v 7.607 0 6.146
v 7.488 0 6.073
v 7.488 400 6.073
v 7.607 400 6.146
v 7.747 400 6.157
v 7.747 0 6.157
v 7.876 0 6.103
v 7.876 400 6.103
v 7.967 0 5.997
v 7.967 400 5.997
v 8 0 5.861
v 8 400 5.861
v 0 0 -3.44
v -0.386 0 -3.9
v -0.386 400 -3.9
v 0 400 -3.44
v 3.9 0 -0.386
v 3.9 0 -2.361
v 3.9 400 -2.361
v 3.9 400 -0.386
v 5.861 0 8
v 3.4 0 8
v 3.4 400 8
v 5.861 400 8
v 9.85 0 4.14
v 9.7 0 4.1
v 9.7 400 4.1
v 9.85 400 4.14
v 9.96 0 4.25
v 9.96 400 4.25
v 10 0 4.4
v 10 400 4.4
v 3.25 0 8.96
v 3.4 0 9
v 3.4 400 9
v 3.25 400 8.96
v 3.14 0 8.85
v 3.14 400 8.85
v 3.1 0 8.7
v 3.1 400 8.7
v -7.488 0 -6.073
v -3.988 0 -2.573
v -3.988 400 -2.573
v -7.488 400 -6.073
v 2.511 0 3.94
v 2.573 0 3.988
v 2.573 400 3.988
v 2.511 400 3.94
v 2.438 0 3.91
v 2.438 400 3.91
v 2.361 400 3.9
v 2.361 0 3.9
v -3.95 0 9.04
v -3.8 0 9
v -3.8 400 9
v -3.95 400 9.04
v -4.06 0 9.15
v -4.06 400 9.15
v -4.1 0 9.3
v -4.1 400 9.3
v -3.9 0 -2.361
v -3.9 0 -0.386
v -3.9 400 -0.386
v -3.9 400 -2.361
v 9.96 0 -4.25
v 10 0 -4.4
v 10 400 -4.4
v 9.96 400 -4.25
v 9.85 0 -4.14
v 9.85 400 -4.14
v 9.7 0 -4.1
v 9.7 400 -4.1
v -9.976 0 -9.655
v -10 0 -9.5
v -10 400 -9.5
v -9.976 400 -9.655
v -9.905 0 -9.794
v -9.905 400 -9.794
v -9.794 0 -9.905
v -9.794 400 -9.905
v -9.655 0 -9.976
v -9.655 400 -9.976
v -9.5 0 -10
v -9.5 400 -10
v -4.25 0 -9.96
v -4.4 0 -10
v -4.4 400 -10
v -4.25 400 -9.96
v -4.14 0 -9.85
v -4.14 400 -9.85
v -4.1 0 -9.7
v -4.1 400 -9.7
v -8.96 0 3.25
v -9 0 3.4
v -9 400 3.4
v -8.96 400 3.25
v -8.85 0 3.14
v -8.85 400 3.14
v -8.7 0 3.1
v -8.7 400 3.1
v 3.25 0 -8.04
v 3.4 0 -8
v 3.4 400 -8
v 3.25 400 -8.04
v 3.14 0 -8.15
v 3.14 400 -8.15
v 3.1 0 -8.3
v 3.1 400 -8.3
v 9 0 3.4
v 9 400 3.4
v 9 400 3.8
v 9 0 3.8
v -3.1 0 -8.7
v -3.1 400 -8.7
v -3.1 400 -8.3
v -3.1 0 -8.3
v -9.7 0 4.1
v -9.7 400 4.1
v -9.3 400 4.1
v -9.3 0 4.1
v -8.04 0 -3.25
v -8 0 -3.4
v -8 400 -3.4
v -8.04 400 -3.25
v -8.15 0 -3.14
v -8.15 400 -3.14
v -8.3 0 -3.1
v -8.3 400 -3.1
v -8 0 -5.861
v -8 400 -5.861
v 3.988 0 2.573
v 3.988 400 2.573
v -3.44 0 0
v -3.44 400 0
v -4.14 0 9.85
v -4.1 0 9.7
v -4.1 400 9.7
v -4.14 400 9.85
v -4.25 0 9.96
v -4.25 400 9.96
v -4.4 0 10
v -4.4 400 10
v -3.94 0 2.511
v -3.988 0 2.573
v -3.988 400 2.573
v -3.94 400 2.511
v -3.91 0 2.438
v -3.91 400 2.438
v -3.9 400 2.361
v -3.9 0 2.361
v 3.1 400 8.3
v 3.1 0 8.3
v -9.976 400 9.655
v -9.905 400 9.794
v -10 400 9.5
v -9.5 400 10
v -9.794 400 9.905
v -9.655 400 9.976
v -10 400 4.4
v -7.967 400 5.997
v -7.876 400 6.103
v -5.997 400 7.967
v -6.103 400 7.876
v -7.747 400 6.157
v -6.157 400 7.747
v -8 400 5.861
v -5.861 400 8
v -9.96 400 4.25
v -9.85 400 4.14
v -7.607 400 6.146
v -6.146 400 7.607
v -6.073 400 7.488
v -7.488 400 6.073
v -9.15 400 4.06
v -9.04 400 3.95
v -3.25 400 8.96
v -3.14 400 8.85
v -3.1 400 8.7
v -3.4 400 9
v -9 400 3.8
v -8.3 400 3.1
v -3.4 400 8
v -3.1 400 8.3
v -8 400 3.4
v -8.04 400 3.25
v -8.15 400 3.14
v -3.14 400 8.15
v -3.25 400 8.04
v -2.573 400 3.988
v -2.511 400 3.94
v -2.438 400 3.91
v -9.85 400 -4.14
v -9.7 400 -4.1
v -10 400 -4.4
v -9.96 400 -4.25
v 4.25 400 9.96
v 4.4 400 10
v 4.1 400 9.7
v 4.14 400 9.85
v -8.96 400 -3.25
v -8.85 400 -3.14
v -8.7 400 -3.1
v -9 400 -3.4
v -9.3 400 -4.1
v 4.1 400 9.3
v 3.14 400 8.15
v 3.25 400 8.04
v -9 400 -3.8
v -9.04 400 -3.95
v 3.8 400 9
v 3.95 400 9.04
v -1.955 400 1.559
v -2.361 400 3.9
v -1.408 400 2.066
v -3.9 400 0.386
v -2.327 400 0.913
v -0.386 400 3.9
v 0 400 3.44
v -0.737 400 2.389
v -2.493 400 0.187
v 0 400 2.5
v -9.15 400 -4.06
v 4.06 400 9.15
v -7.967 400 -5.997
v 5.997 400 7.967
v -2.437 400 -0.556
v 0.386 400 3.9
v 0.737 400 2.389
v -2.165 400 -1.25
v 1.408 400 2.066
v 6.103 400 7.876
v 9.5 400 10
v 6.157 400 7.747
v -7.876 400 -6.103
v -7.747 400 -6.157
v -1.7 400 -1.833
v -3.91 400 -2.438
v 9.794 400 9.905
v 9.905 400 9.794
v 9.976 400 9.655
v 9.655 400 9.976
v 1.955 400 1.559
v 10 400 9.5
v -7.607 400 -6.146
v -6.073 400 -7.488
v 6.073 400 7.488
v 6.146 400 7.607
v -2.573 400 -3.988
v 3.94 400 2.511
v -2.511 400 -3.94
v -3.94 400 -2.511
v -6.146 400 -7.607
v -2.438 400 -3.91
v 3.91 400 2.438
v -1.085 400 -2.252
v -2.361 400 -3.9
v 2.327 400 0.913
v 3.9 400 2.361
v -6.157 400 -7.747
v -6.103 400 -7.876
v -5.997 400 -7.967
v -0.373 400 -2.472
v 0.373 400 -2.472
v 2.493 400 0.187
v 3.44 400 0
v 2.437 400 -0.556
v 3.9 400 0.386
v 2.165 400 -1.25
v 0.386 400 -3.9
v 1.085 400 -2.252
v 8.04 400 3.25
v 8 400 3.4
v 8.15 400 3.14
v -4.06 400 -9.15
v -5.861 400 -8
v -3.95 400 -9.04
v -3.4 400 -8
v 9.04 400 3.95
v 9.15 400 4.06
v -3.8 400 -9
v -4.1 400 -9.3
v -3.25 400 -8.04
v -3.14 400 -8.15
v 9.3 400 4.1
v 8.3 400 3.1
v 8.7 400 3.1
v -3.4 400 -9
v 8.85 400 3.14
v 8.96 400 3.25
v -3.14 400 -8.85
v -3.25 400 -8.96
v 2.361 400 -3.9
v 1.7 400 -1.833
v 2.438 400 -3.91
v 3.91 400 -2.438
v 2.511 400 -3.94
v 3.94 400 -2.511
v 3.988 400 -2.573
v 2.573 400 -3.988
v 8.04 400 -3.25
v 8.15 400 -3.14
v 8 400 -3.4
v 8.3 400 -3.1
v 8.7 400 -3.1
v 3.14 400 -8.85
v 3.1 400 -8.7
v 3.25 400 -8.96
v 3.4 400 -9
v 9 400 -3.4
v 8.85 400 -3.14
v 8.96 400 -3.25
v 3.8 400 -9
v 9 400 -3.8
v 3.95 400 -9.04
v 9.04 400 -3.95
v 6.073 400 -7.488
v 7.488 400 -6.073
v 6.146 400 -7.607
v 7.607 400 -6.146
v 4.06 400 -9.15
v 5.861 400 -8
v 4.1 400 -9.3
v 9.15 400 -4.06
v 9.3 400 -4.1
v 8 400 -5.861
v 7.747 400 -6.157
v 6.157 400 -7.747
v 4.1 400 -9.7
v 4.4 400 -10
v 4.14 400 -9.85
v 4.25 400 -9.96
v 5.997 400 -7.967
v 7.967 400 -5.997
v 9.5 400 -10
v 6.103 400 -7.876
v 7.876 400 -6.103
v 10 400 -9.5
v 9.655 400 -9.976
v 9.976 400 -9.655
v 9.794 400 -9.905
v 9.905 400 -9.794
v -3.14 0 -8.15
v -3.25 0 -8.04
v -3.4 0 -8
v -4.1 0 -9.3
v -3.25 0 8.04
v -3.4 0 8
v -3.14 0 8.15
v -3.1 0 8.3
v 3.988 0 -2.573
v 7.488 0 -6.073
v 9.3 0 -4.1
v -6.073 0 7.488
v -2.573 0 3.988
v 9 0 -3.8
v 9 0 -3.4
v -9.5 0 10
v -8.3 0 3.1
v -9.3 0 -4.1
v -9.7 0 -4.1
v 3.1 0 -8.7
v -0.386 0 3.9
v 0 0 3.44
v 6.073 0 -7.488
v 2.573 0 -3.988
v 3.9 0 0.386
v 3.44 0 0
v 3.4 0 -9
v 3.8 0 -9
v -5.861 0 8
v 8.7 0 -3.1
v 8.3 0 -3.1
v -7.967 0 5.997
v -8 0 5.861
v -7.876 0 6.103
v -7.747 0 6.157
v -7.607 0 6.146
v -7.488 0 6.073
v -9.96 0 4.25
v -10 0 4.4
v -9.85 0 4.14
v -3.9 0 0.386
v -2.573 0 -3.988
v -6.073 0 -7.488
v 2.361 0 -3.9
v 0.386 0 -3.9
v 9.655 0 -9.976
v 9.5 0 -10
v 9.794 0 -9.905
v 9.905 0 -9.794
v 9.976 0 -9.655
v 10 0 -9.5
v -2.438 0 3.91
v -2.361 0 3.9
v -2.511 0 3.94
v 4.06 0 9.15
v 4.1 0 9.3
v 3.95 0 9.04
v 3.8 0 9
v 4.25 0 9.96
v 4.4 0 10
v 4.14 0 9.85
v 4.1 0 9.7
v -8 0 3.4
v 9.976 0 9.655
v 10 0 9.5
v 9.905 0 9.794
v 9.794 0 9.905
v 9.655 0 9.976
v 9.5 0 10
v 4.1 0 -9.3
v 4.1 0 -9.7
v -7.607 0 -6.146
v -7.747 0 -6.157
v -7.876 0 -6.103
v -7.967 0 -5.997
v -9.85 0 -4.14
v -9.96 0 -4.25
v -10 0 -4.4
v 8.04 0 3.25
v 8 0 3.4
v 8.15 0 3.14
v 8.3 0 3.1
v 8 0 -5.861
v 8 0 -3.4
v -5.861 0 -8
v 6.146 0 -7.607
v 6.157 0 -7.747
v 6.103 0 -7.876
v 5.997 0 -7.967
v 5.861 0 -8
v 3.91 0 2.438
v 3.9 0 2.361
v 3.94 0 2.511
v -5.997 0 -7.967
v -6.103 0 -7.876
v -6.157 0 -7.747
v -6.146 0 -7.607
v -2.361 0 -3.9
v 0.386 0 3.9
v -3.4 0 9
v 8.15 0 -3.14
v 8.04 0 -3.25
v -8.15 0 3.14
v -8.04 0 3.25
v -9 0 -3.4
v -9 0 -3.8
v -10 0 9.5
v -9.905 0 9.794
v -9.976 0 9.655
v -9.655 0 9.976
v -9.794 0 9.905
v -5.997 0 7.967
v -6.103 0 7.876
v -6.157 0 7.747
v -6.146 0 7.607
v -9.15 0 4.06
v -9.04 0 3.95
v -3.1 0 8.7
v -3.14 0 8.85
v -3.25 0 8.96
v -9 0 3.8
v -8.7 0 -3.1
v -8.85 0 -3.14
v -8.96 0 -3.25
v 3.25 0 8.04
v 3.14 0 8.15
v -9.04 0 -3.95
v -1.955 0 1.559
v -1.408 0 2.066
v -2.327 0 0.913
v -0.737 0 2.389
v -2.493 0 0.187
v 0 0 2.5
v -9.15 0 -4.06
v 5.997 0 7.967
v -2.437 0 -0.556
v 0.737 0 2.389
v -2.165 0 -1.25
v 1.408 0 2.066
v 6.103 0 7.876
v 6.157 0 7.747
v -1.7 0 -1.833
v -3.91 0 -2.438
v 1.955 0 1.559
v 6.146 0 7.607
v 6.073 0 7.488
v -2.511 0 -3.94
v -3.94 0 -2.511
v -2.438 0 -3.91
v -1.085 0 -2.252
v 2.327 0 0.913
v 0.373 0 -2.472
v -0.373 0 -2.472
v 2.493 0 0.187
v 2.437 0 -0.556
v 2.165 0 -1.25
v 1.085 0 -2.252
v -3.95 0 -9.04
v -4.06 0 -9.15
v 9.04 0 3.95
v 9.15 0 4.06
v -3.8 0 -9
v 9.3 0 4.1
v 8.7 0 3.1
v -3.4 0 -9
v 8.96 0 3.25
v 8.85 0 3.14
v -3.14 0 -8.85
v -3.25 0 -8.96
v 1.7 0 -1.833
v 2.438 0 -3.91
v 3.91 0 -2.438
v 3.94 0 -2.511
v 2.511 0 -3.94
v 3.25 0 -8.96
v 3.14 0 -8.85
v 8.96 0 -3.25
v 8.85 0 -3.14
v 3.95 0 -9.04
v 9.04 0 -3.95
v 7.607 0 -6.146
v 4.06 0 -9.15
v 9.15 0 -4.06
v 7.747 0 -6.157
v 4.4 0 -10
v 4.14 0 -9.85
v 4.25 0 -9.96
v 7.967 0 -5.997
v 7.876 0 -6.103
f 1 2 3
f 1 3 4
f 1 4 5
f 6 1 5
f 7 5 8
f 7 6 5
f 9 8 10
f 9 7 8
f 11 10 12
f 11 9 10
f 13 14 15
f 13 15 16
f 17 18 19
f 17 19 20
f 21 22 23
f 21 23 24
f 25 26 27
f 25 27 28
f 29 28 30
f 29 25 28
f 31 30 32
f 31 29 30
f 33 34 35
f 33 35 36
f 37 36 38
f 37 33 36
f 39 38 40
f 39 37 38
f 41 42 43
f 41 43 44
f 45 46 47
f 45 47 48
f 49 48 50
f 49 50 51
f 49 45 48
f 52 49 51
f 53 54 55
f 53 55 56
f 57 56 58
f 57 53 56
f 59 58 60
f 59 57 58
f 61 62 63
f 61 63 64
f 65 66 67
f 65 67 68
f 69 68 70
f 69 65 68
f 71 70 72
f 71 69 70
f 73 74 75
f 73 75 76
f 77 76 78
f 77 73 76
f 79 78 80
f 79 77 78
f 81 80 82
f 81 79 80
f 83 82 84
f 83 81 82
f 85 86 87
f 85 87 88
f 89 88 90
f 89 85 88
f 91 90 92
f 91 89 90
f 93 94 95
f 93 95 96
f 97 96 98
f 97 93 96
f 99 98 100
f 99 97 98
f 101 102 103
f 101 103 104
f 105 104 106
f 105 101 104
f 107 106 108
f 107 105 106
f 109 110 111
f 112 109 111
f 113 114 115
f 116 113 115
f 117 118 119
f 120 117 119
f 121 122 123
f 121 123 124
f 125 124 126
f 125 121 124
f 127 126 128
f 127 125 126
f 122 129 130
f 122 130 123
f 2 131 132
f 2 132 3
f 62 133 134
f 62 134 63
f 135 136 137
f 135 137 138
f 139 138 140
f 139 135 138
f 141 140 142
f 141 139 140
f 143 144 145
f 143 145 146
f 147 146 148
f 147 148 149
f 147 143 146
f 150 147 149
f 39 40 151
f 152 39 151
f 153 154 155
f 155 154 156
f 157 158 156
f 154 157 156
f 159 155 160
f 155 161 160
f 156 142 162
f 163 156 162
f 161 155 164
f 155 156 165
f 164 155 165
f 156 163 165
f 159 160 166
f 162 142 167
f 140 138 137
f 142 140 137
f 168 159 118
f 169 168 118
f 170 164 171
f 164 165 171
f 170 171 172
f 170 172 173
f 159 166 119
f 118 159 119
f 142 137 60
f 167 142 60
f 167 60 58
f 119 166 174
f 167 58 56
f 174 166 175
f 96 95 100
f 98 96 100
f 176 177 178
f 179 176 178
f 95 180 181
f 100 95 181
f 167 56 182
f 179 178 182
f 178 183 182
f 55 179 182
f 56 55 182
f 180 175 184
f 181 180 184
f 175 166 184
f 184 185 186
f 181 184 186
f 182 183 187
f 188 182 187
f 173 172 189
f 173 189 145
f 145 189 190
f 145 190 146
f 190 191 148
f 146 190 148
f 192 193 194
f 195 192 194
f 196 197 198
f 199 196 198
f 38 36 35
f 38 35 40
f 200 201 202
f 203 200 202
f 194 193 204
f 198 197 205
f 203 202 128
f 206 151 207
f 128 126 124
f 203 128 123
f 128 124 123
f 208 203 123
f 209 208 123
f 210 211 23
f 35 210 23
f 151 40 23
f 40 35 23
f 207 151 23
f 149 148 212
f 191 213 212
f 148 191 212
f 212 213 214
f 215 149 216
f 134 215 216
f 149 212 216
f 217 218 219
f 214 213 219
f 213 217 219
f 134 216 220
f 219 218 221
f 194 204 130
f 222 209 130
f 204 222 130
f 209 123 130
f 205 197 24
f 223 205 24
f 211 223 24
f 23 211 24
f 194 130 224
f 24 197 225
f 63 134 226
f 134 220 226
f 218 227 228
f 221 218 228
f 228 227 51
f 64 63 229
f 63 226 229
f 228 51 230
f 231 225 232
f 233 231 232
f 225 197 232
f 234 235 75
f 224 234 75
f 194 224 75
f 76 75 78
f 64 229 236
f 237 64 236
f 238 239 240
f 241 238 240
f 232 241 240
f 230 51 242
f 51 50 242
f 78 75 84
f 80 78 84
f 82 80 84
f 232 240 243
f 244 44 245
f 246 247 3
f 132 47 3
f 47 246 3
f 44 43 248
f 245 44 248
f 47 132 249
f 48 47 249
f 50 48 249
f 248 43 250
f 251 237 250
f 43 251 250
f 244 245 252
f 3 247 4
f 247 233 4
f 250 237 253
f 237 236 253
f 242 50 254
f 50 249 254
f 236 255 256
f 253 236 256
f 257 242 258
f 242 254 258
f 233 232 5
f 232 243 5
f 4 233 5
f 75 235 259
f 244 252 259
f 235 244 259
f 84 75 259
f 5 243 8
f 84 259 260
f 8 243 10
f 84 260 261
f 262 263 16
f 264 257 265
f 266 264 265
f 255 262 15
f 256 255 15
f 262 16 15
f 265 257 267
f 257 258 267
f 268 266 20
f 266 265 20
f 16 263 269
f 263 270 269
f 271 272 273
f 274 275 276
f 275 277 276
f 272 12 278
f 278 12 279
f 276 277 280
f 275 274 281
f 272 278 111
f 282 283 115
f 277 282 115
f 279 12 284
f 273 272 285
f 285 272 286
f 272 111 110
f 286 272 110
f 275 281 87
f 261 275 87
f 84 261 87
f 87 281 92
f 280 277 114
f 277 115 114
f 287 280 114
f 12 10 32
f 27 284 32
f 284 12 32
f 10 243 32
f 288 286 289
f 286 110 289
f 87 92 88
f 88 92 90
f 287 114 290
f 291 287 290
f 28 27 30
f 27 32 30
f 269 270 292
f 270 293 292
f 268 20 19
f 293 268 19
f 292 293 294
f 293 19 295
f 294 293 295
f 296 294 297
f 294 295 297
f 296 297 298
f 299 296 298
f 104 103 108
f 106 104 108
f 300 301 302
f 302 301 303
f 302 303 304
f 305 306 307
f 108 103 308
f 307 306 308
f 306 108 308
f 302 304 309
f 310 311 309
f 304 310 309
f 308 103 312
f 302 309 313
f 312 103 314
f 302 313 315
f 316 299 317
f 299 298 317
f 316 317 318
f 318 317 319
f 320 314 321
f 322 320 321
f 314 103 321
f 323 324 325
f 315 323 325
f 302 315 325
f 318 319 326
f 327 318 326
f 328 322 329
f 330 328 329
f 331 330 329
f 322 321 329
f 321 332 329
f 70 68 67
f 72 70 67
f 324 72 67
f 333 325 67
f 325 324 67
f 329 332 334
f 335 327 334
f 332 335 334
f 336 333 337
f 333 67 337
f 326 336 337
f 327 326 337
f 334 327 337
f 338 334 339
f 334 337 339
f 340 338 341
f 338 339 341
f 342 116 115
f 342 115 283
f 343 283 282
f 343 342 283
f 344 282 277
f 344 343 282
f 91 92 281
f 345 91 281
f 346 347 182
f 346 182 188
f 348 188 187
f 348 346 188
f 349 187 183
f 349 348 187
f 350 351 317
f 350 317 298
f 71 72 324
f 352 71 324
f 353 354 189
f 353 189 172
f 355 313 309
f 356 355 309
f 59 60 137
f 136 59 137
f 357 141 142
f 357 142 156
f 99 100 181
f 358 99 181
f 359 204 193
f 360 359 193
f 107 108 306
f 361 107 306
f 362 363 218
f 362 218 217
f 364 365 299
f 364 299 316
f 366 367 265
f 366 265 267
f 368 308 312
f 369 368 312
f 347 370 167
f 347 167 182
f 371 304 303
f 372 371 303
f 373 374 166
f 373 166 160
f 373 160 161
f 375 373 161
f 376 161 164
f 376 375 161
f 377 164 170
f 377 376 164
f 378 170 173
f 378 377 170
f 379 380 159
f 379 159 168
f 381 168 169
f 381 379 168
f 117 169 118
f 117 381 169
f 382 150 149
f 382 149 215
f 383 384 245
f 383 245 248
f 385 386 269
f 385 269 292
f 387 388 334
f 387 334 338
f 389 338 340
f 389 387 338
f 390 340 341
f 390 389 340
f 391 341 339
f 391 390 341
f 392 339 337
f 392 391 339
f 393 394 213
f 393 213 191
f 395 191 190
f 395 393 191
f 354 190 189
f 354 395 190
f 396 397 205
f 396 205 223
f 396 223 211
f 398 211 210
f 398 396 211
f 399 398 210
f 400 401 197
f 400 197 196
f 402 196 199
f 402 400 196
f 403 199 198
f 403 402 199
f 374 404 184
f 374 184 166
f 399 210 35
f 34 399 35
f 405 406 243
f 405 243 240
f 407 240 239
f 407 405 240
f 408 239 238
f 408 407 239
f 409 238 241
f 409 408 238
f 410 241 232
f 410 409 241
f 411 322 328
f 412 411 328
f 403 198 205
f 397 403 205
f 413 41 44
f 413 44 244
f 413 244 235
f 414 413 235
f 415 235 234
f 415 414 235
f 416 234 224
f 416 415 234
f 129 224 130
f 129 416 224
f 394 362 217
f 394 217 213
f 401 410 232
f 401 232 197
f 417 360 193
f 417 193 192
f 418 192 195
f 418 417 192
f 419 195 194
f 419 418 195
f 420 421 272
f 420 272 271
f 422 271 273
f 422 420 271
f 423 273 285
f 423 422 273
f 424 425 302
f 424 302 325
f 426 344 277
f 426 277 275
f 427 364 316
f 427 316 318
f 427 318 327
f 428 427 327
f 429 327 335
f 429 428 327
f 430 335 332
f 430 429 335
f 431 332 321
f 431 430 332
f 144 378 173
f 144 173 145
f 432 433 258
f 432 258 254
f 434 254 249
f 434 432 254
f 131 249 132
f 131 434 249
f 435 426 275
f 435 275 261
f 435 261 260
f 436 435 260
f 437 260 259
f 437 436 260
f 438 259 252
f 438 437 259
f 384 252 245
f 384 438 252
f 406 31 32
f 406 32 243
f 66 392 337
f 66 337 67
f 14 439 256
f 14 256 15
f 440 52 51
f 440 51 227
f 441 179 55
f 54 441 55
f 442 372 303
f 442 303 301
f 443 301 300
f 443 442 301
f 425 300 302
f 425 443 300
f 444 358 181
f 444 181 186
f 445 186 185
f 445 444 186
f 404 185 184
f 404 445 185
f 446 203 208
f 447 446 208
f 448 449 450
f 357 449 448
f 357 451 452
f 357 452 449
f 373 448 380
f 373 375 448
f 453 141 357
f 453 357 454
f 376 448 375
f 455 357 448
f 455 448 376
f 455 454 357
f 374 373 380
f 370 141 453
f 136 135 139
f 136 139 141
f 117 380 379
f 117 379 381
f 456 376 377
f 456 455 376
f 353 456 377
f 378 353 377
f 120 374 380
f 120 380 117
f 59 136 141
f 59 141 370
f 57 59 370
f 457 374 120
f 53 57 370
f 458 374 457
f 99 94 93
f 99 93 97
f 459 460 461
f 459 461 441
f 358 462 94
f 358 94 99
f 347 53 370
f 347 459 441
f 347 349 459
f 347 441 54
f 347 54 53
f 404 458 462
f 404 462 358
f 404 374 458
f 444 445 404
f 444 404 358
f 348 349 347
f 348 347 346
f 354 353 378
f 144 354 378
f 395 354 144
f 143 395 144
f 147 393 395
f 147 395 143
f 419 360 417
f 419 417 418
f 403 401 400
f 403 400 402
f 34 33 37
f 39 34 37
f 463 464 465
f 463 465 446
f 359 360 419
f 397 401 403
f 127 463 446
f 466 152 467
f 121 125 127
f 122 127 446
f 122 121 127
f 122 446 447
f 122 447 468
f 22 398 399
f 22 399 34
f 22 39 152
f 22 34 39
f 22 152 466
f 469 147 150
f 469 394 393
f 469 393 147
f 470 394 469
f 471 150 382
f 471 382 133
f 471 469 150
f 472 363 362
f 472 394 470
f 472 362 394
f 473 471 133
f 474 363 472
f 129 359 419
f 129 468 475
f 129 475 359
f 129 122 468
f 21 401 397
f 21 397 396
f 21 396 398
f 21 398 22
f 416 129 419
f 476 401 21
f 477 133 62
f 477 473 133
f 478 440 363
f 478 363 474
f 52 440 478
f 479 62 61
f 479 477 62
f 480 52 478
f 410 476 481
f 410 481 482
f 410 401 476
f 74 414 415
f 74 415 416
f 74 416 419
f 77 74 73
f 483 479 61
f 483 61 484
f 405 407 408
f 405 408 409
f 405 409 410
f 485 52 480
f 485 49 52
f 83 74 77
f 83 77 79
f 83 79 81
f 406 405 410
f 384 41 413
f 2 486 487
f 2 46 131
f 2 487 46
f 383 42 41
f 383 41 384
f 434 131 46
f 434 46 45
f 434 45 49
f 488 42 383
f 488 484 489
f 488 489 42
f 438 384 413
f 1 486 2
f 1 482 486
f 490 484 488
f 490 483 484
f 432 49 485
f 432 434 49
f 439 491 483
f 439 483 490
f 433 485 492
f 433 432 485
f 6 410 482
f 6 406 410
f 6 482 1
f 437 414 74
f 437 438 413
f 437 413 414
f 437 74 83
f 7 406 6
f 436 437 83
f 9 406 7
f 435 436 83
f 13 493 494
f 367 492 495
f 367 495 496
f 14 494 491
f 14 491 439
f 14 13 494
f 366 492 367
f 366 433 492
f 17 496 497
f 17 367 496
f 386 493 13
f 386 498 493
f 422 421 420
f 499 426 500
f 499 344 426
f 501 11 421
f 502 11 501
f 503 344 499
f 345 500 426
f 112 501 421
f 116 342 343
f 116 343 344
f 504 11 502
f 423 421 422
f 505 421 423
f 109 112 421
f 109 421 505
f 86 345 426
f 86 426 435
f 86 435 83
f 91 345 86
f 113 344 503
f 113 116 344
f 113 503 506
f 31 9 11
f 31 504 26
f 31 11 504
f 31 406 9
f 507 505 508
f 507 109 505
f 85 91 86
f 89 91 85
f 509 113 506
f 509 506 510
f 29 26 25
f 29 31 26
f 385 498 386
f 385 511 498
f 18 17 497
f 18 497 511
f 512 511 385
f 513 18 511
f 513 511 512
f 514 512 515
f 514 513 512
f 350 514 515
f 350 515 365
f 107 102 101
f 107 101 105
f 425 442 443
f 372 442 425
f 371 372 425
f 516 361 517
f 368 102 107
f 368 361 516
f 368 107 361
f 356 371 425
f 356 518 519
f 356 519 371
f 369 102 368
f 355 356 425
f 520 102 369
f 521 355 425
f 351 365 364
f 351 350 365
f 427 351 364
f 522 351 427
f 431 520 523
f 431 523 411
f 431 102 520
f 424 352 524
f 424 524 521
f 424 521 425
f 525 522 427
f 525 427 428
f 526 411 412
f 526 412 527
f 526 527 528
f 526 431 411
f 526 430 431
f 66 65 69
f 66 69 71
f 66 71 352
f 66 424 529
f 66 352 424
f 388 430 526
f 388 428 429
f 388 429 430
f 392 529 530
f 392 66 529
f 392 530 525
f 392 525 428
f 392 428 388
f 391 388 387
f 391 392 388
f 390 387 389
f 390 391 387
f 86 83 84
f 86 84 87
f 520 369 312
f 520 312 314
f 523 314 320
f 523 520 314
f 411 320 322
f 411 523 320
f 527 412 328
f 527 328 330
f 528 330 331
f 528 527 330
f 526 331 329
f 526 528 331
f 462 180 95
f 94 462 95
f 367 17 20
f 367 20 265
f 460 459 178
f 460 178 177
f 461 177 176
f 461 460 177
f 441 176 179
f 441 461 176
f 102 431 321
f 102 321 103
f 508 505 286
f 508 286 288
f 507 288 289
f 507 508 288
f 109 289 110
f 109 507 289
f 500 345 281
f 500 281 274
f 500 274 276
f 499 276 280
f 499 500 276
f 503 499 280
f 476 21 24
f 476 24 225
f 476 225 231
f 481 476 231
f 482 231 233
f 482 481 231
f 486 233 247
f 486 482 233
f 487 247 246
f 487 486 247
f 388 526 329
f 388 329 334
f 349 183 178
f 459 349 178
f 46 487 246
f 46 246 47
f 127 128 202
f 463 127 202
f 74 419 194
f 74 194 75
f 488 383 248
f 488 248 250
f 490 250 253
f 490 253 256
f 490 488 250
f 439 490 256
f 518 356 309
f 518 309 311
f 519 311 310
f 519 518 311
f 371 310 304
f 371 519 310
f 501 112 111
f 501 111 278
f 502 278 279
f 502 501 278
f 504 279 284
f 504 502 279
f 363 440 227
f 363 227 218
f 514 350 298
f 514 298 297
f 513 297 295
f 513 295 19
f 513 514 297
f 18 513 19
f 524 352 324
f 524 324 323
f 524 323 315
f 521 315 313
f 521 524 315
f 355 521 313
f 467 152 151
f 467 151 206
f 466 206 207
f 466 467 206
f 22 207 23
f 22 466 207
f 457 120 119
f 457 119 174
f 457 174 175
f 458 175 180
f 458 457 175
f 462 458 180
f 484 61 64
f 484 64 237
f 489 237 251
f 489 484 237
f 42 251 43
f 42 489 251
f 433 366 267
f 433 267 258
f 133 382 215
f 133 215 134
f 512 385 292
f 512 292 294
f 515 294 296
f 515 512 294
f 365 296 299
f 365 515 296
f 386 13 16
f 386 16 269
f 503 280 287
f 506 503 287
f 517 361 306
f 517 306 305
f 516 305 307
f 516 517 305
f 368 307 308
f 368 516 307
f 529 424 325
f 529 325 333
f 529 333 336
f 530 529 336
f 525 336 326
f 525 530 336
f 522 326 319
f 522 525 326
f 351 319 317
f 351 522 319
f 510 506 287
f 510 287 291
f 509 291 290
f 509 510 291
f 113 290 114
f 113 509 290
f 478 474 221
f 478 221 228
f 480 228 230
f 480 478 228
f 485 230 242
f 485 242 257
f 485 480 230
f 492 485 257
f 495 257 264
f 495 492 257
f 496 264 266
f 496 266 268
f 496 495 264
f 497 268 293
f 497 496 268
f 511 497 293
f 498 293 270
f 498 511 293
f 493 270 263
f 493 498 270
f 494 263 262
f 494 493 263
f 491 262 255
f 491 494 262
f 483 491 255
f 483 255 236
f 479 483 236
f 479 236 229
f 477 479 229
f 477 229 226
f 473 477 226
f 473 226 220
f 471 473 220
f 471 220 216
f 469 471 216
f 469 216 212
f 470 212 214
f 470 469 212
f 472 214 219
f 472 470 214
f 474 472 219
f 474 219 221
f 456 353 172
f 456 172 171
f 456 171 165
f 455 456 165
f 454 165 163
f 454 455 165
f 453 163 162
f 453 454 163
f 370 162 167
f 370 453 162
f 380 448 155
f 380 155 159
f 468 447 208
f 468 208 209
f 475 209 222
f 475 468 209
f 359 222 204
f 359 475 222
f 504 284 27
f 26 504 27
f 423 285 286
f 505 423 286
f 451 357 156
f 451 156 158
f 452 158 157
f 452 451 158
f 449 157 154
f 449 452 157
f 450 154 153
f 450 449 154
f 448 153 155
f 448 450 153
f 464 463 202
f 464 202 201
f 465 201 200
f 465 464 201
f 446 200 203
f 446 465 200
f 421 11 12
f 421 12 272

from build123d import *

# Parameters (mm, degrees)
SKETCH2_R                 = 2.5
VUONG_NHOMDH20X20_1_DEPTH = 400


with BuildPart() as part:
    # Sketch2 → Vuong NHOMDH20X20(1) (new body)
    with BuildSketch(Plane.ZX):
        with BuildLine():
            Line((0.385672566, 3.9), (2.360735931, 3.9))
            ThreePointArc((2.360735931, 3.9), (2.475540961, 3.92283614), (2.572867966, 3.987867966))
            Line((2.572867966, 3.987867966), (6.072867966, 7.487867966))
            ThreePointArc((6.072867966, 7.487867966), (6.137899791, 7.81480503), (5.860735931, 8))
            Line((5.860735931, 8), (3.4, 8))
            ThreePointArc((3.4, 8), (3.187867966, 8.087867966), (3.1, 8.3))
            Line((3.1, 8.3), (3.1, 8.7))
            ThreePointArc((3.1, 8.7), (3.187867966, 8.912132034), (3.4, 9))
            Line((3.4, 9), (3.8, 9))
            ThreePointArc((3.8, 9), (4.012132034, 9.087867966), (4.1, 9.3))
            Line((4.1, 9.3), (4.1, 9.7))
            ThreePointArc((4.1, 9.7), (4.187867966, 9.912132034), (4.4, 10))
            Line((4.4, 10), (9.5, 10))
            ThreePointArc((9.5, 10), (9.853553391, 9.853553391), (10, 9.5))
            Line((10, 9.5), (10, 4.4))
            ThreePointArc((10, 4.4), (9.912132034, 4.187867966), (9.7, 4.1))
            Line((9.7, 4.1), (9.3, 4.1))
            ThreePointArc((9.3, 4.1), (9.087867966, 4.012132034), (9, 3.8))
            Line((9, 3.8), (9, 3.4))
            ThreePointArc((9, 3.4), (8.912132034, 3.187867966), (8.7, 3.1))
            Line((8.7, 3.1), (8.3, 3.1))
            ThreePointArc((8.3, 3.1), (8.087867966, 3.187867966), (8, 3.4))
            Line((8, 3.4), (8, 5.860735931))
            ThreePointArc((8, 5.860735931), (7.81480503, 6.137899791), (7.487867966, 6.072867966))
            Line((7.487867966, 6.072867966), (3.987867966, 2.572867966))
            ThreePointArc((3.987867966, 2.572867966), (3.92283614, 2.475540961), (3.9, 2.360735931))
            Line((3.9, 2.360735931), (3.9, 0.385672566))
            Line((3.9, 0.385672566), (3.440373334, 0))
            Line((3.440373334, 0), (3.9, -0.385672566))
            Line((3.9, -0.385672566), (3.9, -2.360735931))
            ThreePointArc((3.9, -2.360735931), (3.92283614, -2.475540961), (3.987867966, -2.572867966))
            Line((3.987867966, -2.572867966), (7.487867966, -6.072867966))
            ThreePointArc((7.487867966, -6.072867966), (7.81480503, -6.137899791), (8, -5.860735931))
            Line((8, -5.860735931), (8, -3.4))
            ThreePointArc((8, -3.4), (8.087867966, -3.187867966), (8.3, -3.1))
            Line((8.3, -3.1), (8.7, -3.1))
            ThreePointArc((8.7, -3.1), (8.912132034, -3.187867966), (9, -3.4))
            Line((9, -3.4), (9, -3.8))
            ThreePointArc((9, -3.8), (9.087867966, -4.012132034), (9.3, -4.1))
            Line((9.3, -4.1), (9.7, -4.1))
            ThreePointArc((9.7, -4.1), (9.912132034, -4.187867966), (10, -4.4))
            Line((10, -4.4), (10, -9.5))
            ThreePointArc((10, -9.5), (9.853553391, -9.853553391), (9.5, -10))
            Line((9.5, -10), (4.4, -10))
            ThreePointArc((4.4, -10), (4.187867966, -9.912132034), (4.1, -9.7))
            Line((4.1, -9.7), (4.1, -9.3))
            ThreePointArc((4.1, -9.3), (4.012132034, -9.087867966), (3.8, -9))
            Line((3.8, -9), (3.4, -9))
            ThreePointArc((3.4, -9), (3.187867966, -8.912132034), (3.1, -8.7))
            Line((3.1, -8.7), (3.1, -8.3))
            ThreePointArc((3.1, -8.3), (3.187867966, -8.087867966), (3.4, -8))
            Line((3.4, -8), (5.860735931, -8))
            ThreePointArc((5.860735931, -8), (6.137899791, -7.81480503), (6.072867966, -7.487867966))
            Line((6.072867966, -7.487867966), (2.572867966, -3.987867966))
            ThreePointArc((2.572867966, -3.987867966), (2.475540961, -3.92283614), (2.360735931, -3.9))
            Line((2.360735931, -3.9), (0.385672566, -3.9))
            Line((0.385672566, -3.9), (0, -3.440373334))
            Line((0, -3.440373334), (-0.385672566, -3.9))
            Line((-0.385672566, -3.9), (-2.360735931, -3.9))
            ThreePointArc((-2.360735931, -3.9), (-2.475540961, -3.92283614), (-2.572867966, -3.987867966))
            Line((-2.572867966, -3.987867966), (-6.072867966, -7.487867966))
            ThreePointArc((-6.072867966, -7.487867966), (-6.137899791, -7.81480503), (-5.860735931, -8))
            Line((-5.860735931, -8), (-3.4, -8))
            ThreePointArc((-3.4, -8), (-3.187867966, -8.087867966), (-3.1, -8.3))
            Line((-3.1, -8.3), (-3.1, -8.7))
            ThreePointArc((-3.1, -8.7), (-3.187867966, -8.912132034), (-3.4, -9))
            Line((-3.4, -9), (-3.8, -9))
            ThreePointArc((-3.8, -9), (-4.012132034, -9.087867966), (-4.1, -9.3))
            Line((-4.1, -9.3), (-4.1, -9.7))
            ThreePointArc((-4.1, -9.7), (-4.187867966, -9.912132034), (-4.4, -10))
            Line((-4.4, -10), (-9.5, -10))
            ThreePointArc((-9.5, -10), (-9.853553391, -9.853553391), (-10, -9.5))
            Line((-10, -9.5), (-10, -4.4))
            ThreePointArc((-10, -4.4), (-9.912132034, -4.187867966), (-9.7, -4.1))
            Line((-9.7, -4.1), (-9.3, -4.1))
            ThreePointArc((-9.3, -4.1), (-9.087867966, -4.012132034), (-9, -3.8))
            Line((-9, -3.8), (-9, -3.4))
            ThreePointArc((-9, -3.4), (-8.912132034, -3.187867966), (-8.7, -3.1))
            Line((-8.7, -3.1), (-8.3, -3.1))
            ThreePointArc((-8.3, -3.1), (-8.087867966, -3.187867966), (-8, -3.4))
            Line((-8, -3.4), (-8, -5.860735931))
            ThreePointArc((-8, -5.860735931), (-7.81480503, -6.137899791), (-7.487867966, -6.072867966))
            Line((-7.487867966, -6.072867966), (-3.987867966, -2.572867966))
            ThreePointArc((-3.987867966, -2.572867966), (-3.92283614, -2.475540961), (-3.9, -2.360735931))
            Line((-3.9, -2.360735931), (-3.9, -0.385672566))
            Line((-3.9, -0.385672566), (-3.440373334, 0))
            Line((-3.440373334, 0), (-3.9, 0.385672566))
            Line((-3.9, 0.385672566), (-3.9, 2.360735931))
            ThreePointArc((-3.9, 2.360735931), (-3.92283614, 2.475540961), (-3.987867966, 2.572867966))
            Line((-3.987867966, 2.572867966), (-7.487867966, 6.072867966))
            ThreePointArc((-7.487867966, 6.072867966), (-7.81480503, 6.137899791), (-8, 5.860735931))
            Line((-8, 5.860735931), (-8, 3.4))
            ThreePointArc((-8, 3.4), (-8.087867966, 3.187867966), (-8.3, 3.1))
            Line((-8.3, 3.1), (-8.7, 3.1))
            ThreePointArc((-8.7, 3.1), (-8.912132034, 3.187867966), (-9, 3.4))
            Line((-9, 3.4), (-9, 3.8))
            ThreePointArc((-9, 3.8), (-9.087867966, 4.012132034), (-9.3, 4.1))
            Line((-9.3, 4.1), (-9.7, 4.1))
            ThreePointArc((-9.7, 4.1), (-9.912132034, 4.187867966), (-10, 4.4))
            Line((-10, 4.4), (-10, 9.5))
            ThreePointArc((-10, 9.5), (-9.853553391, 9.853553391), (-9.5, 10))
            Line((-9.5, 10), (-4.4, 10))
            ThreePointArc((-4.4, 10), (-4.187867966, 9.912132034), (-4.1, 9.7))
            Line((-4.1, 9.7), (-4.1, 9.3))
            ThreePointArc((-4.1, 9.3), (-4.012132034, 9.087867966), (-3.8, 9))
            Line((-3.8, 9), (-3.4, 9))
            ThreePointArc((-3.4, 9), (-3.187867966, 8.912132034), (-3.1, 8.7))
            Line((-3.1, 8.7), (-3.1, 8.3))
            ThreePointArc((-3.1, 8.3), (-3.187867966, 8.087867966), (-3.4, 8))
            Line((-3.4, 8), (-5.860735931, 8))
            ThreePointArc((-5.860735931, 8), (-6.137899791, 7.81480503), (-6.072867966, 7.487867966))
            Line((-6.072867966, 7.487867966), (-2.572867966, 3.987867966))
            ThreePointArc((-2.572867966, 3.987867966), (-2.475540961, 3.92283614), (-2.360735931, 3.9))
            Line((-2.360735931, 3.9), (-0.385672566, 3.9))
            Line((-0.385672566, 3.9), (0, 3.440373334))
            Line((0, 3.440373334), (0.385672566, 3.9))
        make_face()
        Circle(SKETCH2_R, mode=Mode.SUBTRACT)
    extrude(amount=VUONG_NHOMDH20X20_1_DEPTH)


solid = part.part
